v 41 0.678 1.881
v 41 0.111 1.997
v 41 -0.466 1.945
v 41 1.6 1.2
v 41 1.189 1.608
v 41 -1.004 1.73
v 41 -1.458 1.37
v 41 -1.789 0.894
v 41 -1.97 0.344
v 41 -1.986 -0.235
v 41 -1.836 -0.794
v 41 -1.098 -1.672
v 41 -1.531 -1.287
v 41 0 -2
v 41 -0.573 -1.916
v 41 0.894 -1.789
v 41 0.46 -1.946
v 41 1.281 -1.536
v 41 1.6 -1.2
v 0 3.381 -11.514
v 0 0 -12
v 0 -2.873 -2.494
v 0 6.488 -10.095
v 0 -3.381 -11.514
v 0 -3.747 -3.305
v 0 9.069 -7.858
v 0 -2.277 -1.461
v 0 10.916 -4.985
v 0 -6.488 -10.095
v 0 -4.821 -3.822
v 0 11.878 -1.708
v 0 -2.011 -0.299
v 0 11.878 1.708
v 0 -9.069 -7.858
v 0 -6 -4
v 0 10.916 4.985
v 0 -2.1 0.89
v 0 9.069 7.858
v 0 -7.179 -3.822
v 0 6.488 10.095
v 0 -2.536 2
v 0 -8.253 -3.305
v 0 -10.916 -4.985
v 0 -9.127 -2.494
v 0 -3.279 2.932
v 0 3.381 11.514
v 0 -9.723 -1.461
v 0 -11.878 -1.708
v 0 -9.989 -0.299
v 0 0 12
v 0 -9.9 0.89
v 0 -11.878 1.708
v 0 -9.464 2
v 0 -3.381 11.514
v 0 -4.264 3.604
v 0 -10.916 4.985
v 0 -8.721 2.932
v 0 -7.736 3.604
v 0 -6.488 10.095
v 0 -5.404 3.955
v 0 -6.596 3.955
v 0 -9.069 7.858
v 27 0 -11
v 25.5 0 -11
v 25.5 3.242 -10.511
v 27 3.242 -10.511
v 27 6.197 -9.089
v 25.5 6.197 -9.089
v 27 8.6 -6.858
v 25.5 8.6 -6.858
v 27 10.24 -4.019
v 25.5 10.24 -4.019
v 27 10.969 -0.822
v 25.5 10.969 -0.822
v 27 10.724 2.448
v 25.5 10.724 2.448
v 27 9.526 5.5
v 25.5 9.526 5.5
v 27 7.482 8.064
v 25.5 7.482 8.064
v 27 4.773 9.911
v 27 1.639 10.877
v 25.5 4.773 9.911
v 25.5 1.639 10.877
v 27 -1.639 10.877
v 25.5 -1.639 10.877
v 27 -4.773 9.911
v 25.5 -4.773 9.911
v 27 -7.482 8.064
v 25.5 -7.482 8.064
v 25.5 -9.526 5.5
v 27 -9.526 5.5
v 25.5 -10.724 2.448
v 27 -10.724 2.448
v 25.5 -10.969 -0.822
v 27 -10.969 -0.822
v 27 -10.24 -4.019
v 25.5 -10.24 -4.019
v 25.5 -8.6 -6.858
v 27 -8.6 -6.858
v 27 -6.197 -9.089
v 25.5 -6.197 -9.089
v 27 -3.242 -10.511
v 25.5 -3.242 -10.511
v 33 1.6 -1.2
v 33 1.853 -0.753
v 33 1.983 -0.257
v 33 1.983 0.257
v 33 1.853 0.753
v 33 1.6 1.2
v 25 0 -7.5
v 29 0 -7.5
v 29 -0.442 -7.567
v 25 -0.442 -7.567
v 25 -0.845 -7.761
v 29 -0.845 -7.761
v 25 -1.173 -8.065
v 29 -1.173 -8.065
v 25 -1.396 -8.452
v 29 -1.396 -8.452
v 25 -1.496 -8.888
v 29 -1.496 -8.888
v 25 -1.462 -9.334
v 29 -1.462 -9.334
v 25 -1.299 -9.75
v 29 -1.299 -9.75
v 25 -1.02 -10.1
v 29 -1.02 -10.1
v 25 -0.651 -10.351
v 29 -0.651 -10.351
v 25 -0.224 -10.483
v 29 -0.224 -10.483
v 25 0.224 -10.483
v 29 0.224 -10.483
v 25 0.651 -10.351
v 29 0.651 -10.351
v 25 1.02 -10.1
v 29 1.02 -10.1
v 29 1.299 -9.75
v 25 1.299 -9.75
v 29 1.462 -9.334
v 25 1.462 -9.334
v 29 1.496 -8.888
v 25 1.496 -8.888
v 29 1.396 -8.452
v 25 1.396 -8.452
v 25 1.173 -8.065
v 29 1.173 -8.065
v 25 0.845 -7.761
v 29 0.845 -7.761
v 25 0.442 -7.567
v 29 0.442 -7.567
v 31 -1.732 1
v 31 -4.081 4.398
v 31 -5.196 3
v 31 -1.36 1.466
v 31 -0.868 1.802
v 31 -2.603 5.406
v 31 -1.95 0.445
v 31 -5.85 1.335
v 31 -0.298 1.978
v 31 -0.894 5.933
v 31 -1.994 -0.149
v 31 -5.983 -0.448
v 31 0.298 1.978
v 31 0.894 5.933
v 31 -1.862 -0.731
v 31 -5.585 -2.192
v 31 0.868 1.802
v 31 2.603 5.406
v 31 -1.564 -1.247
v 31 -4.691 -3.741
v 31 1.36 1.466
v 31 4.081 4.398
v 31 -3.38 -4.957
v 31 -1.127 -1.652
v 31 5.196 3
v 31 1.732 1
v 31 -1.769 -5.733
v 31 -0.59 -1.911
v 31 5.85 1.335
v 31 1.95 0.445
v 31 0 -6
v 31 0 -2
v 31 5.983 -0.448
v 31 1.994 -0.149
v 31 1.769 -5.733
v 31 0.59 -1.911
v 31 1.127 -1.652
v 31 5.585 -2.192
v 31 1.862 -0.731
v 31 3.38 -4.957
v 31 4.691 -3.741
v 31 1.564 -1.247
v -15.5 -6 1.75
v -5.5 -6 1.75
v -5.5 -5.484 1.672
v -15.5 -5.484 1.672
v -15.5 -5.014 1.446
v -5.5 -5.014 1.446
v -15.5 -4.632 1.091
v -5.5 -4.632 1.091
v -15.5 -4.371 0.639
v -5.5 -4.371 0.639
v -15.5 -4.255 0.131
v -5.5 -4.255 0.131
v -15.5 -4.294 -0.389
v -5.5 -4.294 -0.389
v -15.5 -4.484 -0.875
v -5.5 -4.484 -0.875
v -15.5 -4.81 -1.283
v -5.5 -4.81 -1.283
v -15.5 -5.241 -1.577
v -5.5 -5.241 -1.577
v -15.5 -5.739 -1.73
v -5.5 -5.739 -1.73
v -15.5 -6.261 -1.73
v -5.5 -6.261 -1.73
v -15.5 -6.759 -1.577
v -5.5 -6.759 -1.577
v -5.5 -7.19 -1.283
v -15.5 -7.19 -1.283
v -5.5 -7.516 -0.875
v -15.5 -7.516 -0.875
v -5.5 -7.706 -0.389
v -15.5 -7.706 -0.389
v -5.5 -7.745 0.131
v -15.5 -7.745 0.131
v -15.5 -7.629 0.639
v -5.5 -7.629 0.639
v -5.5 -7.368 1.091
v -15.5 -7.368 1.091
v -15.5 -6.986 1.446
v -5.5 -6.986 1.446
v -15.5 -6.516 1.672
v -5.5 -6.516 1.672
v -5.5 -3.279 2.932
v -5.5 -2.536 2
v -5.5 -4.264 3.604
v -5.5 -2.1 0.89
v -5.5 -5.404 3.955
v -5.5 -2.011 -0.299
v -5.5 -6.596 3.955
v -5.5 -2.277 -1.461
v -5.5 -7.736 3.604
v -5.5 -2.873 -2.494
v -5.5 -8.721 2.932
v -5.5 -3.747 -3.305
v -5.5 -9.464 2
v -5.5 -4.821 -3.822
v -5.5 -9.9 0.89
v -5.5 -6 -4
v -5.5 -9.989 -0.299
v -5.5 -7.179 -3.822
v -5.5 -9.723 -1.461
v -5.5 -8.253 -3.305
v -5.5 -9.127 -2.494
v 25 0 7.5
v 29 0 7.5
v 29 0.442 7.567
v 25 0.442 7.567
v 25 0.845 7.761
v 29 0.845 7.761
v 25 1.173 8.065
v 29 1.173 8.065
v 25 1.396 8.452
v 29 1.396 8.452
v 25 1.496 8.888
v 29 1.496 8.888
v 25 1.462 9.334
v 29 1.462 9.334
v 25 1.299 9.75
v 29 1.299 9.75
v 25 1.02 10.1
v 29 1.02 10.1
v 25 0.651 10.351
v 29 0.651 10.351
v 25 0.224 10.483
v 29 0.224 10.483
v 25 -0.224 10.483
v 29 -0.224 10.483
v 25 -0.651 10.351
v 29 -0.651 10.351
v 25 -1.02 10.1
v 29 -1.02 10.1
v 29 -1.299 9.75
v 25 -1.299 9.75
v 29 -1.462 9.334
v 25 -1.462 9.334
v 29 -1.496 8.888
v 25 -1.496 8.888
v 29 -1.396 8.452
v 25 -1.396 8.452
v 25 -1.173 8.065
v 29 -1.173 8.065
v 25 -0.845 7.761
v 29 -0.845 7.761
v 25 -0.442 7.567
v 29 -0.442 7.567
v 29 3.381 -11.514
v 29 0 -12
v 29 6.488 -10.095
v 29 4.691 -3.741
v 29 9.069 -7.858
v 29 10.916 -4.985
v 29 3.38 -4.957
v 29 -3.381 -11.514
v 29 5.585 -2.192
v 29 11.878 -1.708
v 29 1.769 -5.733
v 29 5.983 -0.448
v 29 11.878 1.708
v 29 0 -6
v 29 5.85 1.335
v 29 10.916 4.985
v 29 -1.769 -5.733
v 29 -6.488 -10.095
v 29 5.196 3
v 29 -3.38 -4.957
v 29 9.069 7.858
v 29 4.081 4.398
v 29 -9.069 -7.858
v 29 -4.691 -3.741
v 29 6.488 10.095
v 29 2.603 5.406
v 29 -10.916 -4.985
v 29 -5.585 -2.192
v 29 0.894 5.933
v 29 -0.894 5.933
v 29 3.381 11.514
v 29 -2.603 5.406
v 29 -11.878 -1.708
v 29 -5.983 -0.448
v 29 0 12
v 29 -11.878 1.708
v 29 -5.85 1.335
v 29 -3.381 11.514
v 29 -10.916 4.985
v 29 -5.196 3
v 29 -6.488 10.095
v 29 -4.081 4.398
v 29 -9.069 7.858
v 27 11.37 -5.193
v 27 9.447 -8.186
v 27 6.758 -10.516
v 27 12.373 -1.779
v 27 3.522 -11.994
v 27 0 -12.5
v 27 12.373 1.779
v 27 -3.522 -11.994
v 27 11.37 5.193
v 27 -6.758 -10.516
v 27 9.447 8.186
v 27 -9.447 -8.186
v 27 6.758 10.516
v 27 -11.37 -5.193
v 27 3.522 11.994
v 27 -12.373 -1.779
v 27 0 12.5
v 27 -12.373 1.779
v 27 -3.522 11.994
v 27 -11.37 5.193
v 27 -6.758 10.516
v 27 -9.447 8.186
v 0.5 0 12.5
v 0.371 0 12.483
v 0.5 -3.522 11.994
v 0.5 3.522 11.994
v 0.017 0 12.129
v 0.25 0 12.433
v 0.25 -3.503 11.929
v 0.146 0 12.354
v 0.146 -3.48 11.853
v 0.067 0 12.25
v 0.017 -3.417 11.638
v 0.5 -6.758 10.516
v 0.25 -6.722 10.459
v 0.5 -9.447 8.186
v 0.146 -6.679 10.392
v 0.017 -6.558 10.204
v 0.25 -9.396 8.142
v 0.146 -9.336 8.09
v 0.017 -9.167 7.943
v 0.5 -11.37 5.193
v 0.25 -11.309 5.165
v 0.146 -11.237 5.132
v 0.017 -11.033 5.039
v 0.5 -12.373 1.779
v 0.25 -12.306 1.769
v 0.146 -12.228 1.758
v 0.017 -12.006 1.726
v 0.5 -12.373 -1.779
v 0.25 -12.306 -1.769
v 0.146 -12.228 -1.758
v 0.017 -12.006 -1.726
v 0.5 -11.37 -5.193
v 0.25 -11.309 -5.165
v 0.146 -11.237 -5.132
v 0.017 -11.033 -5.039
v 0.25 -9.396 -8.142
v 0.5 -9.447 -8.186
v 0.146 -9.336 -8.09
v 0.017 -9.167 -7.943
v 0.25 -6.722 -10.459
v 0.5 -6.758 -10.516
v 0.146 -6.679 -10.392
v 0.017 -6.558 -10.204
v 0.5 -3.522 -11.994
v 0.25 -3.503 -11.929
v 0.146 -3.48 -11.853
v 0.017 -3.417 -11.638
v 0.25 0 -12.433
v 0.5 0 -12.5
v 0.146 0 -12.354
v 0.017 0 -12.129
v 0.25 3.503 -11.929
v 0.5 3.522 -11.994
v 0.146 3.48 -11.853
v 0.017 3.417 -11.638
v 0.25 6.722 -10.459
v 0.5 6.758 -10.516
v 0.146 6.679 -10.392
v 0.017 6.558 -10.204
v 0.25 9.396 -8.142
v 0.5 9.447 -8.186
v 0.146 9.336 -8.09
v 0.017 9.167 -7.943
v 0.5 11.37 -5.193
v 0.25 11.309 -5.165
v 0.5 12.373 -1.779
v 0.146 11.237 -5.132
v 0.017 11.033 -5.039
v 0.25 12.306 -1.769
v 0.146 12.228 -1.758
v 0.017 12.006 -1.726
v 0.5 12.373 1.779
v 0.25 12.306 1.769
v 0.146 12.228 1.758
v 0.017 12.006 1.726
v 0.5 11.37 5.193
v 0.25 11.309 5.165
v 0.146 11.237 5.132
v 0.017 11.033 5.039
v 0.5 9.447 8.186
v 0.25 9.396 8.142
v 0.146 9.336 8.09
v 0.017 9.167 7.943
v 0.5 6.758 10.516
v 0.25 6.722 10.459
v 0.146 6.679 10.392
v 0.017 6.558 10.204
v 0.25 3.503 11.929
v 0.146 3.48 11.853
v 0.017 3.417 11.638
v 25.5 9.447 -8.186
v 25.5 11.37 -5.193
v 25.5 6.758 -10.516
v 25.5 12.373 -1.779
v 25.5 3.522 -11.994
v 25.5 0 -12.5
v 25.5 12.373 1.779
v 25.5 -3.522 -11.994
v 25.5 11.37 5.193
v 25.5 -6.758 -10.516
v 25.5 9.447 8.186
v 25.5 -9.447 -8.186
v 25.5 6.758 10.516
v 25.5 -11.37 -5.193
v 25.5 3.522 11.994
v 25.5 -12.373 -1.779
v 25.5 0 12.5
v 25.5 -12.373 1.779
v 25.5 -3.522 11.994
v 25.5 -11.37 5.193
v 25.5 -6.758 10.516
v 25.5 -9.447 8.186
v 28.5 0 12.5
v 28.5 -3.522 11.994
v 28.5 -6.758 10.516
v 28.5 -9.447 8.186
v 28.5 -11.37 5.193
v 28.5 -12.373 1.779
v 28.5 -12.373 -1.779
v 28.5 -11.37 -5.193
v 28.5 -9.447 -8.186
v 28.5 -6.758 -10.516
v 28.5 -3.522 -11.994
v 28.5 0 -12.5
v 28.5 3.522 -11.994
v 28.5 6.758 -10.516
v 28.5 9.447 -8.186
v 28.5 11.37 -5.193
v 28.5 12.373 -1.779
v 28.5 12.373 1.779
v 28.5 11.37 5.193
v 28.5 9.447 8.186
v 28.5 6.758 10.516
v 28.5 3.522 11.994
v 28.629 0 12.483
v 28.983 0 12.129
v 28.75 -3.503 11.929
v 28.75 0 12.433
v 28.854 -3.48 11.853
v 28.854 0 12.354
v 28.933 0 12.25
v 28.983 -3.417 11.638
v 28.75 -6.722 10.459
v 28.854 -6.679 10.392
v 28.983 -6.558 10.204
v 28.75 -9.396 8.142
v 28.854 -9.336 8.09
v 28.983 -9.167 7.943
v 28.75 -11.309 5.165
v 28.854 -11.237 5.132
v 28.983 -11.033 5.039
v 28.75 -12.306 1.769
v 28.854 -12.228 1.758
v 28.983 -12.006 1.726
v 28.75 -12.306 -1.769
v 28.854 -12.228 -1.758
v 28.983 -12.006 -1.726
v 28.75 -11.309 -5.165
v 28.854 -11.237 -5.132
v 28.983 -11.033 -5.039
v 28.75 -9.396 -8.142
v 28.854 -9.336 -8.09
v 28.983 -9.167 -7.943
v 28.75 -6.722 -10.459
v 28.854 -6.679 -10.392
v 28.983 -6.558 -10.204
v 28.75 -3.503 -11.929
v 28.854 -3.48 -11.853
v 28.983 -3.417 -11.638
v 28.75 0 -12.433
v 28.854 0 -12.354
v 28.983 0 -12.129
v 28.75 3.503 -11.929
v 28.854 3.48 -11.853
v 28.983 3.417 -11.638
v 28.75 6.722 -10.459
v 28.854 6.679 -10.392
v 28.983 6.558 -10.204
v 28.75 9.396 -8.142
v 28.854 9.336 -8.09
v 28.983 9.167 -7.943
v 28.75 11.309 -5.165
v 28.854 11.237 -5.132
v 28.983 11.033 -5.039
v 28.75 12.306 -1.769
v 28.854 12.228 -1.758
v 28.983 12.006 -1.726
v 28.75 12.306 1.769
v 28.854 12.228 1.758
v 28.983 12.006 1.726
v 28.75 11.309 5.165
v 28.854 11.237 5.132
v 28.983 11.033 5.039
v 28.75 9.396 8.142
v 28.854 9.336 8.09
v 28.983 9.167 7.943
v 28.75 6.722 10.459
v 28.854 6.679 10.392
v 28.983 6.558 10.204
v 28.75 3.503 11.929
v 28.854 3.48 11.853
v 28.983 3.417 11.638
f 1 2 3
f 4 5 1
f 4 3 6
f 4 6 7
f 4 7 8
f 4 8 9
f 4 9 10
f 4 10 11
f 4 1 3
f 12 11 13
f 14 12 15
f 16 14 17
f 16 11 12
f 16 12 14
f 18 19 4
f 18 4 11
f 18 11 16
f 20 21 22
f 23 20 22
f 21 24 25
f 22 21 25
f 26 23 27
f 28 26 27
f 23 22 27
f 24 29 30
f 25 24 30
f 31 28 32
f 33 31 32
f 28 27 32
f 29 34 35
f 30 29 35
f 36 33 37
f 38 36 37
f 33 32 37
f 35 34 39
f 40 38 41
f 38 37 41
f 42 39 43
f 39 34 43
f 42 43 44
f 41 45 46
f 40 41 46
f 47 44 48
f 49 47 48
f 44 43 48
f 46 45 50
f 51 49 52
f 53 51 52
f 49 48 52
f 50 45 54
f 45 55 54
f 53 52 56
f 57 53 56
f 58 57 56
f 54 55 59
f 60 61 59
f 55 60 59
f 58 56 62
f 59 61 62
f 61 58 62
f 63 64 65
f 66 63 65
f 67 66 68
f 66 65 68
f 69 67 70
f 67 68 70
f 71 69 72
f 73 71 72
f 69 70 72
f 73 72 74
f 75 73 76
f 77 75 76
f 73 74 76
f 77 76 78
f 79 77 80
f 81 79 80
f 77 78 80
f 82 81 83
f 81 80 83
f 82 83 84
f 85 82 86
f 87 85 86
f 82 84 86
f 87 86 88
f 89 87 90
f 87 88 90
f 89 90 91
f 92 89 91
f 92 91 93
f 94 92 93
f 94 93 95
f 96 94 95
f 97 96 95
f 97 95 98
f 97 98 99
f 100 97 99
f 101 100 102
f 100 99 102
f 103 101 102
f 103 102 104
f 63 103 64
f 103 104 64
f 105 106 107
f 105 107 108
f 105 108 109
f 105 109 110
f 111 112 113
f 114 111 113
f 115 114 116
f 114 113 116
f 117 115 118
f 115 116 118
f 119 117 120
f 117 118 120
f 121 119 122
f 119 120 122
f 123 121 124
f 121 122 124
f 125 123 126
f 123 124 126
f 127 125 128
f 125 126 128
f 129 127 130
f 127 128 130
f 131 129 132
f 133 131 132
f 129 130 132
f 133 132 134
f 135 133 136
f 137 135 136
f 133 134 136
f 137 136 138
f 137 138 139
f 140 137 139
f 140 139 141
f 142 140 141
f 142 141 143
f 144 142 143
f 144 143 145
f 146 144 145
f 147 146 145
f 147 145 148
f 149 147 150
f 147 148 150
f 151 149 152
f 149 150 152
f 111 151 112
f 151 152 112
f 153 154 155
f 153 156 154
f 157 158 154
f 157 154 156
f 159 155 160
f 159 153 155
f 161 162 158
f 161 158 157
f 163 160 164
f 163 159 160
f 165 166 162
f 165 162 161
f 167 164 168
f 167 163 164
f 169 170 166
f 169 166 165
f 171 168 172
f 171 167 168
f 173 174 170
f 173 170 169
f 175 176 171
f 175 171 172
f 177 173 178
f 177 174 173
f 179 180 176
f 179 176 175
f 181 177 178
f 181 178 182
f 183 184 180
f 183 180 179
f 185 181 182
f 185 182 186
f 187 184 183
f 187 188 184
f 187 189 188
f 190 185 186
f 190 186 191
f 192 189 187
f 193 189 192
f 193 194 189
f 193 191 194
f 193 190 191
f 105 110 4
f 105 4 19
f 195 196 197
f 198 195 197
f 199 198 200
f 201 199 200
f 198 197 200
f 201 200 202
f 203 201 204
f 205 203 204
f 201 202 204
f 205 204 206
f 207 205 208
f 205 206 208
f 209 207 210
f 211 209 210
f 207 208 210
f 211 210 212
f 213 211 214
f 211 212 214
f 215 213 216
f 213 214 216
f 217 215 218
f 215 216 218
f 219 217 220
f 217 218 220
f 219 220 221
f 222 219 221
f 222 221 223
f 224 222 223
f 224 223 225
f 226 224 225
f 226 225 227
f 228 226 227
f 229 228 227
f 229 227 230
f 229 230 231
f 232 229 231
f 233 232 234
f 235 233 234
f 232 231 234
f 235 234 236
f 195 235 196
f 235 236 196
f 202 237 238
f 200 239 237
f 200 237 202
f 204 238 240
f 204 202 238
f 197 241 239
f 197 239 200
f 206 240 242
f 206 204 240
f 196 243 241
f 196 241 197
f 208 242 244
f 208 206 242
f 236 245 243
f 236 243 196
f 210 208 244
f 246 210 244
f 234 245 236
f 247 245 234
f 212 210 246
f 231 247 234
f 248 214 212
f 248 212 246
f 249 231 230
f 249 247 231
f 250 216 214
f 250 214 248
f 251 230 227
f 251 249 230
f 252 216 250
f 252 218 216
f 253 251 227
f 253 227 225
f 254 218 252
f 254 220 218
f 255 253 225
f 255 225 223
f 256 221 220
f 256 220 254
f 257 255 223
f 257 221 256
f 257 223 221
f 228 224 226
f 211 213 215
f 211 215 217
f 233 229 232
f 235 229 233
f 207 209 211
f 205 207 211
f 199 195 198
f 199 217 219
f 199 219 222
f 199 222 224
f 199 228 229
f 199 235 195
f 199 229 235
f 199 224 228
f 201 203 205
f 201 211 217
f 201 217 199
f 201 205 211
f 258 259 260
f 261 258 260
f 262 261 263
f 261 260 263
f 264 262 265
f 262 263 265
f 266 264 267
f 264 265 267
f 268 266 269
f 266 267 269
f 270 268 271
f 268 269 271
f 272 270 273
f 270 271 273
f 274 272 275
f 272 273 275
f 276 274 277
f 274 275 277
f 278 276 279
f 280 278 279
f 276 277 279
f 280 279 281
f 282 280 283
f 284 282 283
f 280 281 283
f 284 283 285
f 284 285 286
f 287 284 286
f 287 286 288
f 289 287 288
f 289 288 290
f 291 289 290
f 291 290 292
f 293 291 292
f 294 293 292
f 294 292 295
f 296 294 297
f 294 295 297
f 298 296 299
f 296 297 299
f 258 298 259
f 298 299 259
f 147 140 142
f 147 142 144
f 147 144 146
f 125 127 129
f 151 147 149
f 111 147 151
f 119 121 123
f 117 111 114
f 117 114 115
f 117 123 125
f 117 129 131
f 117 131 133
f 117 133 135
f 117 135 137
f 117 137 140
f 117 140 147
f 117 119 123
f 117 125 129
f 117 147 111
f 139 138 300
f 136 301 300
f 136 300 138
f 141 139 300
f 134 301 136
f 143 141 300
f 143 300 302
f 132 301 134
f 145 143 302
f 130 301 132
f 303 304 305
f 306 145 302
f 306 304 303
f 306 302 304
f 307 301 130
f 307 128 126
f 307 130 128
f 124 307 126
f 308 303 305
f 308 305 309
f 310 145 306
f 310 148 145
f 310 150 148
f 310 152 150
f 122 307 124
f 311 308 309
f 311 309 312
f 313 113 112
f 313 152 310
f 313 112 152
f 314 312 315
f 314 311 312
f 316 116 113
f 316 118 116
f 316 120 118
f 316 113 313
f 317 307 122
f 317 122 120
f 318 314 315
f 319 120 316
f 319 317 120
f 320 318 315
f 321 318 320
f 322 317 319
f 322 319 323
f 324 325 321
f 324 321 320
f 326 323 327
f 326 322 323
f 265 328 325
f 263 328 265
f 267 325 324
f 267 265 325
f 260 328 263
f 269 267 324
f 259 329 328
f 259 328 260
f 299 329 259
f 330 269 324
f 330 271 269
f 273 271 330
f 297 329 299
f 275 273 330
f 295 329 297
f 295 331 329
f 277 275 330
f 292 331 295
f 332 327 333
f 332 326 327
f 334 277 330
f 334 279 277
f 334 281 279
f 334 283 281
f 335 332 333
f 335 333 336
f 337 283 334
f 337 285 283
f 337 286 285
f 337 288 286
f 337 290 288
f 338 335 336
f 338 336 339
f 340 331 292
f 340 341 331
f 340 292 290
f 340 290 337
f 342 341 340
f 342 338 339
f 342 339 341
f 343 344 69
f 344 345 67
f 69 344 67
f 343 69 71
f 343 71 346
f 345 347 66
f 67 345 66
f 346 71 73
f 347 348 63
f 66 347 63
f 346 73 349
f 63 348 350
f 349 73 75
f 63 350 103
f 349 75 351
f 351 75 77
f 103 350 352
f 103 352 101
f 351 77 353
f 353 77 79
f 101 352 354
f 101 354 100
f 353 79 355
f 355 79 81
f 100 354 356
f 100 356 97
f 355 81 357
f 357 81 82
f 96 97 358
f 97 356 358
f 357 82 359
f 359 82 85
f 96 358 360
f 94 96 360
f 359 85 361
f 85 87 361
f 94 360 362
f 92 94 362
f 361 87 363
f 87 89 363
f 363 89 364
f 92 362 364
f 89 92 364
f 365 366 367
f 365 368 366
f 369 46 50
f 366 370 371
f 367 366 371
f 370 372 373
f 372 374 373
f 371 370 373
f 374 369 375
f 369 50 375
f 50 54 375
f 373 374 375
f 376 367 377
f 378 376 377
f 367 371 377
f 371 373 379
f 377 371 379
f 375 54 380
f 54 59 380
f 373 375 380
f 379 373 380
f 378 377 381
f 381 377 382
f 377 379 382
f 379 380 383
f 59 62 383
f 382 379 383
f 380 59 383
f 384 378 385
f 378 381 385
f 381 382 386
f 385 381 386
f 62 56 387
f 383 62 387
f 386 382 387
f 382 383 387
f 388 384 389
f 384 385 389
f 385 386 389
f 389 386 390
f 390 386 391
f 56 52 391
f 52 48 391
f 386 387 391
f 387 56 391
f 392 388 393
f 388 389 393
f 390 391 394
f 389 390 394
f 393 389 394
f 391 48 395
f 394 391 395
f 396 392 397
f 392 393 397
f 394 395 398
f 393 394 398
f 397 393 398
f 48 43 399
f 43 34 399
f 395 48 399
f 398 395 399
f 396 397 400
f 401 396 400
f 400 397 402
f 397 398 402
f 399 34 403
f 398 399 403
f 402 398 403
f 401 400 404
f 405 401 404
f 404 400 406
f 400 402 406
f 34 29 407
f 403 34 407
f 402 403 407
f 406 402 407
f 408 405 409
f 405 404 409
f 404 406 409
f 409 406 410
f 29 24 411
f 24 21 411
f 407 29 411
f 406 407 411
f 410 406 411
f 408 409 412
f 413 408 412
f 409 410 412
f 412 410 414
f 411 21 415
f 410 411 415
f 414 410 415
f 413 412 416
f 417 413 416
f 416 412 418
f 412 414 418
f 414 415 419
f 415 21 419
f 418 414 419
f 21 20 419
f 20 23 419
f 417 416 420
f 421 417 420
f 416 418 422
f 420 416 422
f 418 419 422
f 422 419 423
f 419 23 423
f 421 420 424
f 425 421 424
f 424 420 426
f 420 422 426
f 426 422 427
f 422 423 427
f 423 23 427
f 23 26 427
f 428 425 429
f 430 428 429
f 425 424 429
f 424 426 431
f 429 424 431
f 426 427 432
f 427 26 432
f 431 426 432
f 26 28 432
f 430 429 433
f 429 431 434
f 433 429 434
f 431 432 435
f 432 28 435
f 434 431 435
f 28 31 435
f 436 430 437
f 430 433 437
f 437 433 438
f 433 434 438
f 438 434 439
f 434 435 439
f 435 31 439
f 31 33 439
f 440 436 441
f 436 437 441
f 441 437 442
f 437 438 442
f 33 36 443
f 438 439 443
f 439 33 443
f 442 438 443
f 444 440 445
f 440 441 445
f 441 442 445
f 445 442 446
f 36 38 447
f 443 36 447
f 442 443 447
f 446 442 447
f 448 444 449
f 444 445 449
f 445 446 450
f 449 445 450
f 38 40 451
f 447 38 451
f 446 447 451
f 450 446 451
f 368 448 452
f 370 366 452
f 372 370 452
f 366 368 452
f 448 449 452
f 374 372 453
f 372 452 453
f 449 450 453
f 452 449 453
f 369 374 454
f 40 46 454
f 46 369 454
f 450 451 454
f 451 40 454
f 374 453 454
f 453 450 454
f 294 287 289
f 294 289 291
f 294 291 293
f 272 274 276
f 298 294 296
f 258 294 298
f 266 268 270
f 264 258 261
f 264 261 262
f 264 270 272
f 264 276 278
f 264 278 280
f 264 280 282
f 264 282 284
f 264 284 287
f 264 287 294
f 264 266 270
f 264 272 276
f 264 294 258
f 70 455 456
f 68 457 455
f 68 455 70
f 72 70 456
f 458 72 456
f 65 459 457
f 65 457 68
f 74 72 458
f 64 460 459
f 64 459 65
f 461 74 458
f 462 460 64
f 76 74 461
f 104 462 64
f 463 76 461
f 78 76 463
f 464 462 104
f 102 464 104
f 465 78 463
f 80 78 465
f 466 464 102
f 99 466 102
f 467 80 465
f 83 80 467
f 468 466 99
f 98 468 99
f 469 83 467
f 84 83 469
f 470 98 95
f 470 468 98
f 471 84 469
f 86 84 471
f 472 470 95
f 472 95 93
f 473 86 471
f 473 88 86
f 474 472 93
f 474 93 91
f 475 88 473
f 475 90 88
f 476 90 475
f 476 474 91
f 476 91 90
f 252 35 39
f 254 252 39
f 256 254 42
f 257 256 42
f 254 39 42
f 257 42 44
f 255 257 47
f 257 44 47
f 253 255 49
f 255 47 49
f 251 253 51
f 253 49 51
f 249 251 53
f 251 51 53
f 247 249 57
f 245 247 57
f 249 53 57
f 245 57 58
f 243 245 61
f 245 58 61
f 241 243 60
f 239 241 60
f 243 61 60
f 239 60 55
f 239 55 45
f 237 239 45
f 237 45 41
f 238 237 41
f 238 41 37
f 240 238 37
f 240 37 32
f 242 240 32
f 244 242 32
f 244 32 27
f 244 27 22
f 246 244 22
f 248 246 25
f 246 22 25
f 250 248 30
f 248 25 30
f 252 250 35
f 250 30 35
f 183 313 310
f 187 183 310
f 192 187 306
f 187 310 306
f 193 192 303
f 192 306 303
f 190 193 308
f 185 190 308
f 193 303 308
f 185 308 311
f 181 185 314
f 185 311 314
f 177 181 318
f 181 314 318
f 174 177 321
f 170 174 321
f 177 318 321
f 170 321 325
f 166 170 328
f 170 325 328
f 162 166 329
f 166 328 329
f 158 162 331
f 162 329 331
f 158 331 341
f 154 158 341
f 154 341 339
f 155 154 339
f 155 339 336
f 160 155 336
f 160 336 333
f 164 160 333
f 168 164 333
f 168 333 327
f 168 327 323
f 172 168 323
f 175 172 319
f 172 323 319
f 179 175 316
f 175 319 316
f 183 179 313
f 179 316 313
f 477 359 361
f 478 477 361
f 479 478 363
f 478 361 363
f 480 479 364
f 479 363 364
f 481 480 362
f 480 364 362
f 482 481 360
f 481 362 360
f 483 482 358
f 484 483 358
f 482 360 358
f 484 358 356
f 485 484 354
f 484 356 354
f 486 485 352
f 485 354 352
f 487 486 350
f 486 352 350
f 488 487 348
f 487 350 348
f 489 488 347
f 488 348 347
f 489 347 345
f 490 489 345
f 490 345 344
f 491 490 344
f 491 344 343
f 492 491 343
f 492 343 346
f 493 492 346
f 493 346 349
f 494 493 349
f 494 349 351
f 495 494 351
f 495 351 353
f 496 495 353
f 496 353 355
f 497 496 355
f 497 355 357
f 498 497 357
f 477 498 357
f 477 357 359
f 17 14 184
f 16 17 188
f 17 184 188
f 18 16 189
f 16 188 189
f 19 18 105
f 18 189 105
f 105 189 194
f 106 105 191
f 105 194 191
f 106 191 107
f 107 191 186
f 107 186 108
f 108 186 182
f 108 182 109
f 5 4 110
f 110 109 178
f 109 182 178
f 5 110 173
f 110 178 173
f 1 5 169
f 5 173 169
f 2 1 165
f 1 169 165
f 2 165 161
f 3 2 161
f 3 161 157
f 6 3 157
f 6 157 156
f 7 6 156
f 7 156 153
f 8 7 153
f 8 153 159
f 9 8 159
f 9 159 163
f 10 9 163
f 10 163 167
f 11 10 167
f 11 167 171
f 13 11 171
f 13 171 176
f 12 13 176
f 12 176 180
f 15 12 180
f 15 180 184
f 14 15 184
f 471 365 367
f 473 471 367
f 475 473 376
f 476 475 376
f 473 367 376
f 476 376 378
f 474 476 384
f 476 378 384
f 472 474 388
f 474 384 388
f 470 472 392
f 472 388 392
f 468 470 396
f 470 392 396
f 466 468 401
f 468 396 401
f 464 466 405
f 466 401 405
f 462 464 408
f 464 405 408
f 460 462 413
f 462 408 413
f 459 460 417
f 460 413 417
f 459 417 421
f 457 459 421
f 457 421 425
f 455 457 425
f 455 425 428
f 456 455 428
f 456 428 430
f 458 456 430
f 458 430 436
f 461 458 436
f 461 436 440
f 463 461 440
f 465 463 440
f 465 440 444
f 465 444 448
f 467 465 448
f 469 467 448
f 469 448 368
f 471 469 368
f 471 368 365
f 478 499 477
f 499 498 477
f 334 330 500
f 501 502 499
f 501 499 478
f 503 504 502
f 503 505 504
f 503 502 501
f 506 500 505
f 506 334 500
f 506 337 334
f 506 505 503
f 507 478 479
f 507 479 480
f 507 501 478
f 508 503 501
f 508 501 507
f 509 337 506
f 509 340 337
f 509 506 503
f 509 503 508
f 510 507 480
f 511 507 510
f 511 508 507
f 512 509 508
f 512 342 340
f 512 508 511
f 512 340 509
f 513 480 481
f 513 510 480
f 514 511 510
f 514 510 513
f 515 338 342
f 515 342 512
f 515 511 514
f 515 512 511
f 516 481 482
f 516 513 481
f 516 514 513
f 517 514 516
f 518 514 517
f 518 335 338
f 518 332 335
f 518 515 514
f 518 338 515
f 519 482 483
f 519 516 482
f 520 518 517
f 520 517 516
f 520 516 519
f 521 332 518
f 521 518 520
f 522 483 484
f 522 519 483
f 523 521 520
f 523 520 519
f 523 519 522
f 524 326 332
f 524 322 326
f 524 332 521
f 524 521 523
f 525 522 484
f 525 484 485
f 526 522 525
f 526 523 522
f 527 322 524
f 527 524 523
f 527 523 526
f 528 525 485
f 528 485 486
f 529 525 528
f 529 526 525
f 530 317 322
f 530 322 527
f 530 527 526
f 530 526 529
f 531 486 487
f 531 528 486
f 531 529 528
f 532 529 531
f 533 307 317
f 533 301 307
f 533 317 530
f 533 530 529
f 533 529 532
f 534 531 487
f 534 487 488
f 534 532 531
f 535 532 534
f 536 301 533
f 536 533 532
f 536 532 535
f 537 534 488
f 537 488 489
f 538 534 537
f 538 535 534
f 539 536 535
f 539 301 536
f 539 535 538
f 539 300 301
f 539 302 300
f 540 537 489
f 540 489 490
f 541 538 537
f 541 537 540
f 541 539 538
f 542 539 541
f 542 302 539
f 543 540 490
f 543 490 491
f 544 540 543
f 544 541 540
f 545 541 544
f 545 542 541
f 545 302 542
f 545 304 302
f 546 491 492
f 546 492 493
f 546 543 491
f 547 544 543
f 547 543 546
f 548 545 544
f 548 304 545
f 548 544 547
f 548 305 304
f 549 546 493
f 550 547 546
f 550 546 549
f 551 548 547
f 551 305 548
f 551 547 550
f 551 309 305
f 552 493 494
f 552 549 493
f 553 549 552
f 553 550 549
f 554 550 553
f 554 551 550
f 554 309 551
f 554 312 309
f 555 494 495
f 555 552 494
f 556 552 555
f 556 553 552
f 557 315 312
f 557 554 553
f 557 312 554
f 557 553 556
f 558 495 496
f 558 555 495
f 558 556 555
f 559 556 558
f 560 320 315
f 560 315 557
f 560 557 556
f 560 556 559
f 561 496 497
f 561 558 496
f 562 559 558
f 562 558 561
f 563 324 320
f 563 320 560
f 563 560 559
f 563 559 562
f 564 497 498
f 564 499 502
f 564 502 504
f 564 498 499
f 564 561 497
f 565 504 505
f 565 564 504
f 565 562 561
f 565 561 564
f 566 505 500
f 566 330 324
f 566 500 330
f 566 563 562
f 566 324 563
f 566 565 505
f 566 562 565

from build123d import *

# Parameters (mm, degrees)
SKETCH_1_R          = 12.5
EXTRUDE_1_DEPTH     = 29
CUT_EXTRUDE_START   = -1.5
SKETCH_2_R          = 12.5
SKETCH_2_R_2        = 11
CUT_EXTRUDE_1_DEPTH = 1.5
FILLET_1_R          = 0.5
SKETCH_3_R          = 6
EXTRUDE_2_DEPTH     = 2
SKETCH_4_R          = 2
EXTRUDE_3_DEPTH     = 10
CUT_EXTRUDE_START_2 = -8
CUT_EXTRUDE_2_DEPTH = 8
SKETCH_6_R          = 4
EXTRUDE_4_DEPTH     = 5.5
SKETCH_7_R          = 1.75
EXTRUDE_5_DEPTH     = 10
SKETCH_8_R          = 1.5
CUT_EXTRUDE_3_DEPTH = 4


with BuildPart() as part:
    # ｽｹｯﾁ1 → ﾎﾞｽ - 押し出し1 (new body)
    with BuildSketch(Plane(origin=(0, 0, 0), x_dir=(0, 0, -1), z_dir=(1, 0, 0))):
        with Locations(Location((0, 0, 0), (0, 0, 180))):
            Circle(SKETCH_1_R)
    extrude(amount=EXTRUDE_1_DEPTH)

    # ｽｹｯﾁ2 → ｶｯﾄ - 押し出し1 (cut)
    with BuildSketch(Plane(origin=(27, 0, 0), x_dir=(0, 0, -1), z_dir=(1, 0, 0)).offset(CUT_EXTRUDE_START)):
        with Locations(Location((0, 0, 0), (0, 0, 180))):
            Circle(SKETCH_2_R)
        Circle(SKETCH_2_R_2, mode=Mode.SUBTRACT)
    extrude(amount=CUT_EXTRUDE_1_DEPTH, mode=Mode.SUBTRACT)

    # ﾌｨﾚｯﾄ1
    fillet_1_edges = [part.edges().sort_by_distance(p)[0] for p in [
        (0, 0, -12.5),
        (29, 0, -12.5),
    ]]
    fillet(fillet_1_edges, radius=FILLET_1_R)

    # ｽｹｯﾁ3 → ﾎﾞｽ - 押し出し2 (add)
    with BuildSketch(Plane(origin=(29, 0, 0), x_dir=(0, 0, -1), z_dir=(1, 0, 0))):
        Circle(SKETCH_3_R)
    extrude(amount=EXTRUDE_2_DEPTH)

    # ｽｹｯﾁ4 → ﾎﾞｽ - 押し出し3 (add)
    with BuildSketch(Plane(origin=(31, 0, 0), x_dir=(0, 0, -1), z_dir=(1, 0, 0))):
        Circle(SKETCH_4_R)
    extrude(amount=EXTRUDE_3_DEPTH)

    # ｽｹｯﾁ5 → ｶｯﾄ - 押し出し2 (cut)
    with BuildSketch(Plane(origin=(41, 0, 0), x_dir=(0, 0, -1), z_dir=(1, 0, 0)).offset(CUT_EXTRUDE_START_2)):
        with BuildLine():
            Line((-1.2, 1.6), (1.2, 1.6))
            ThreePointArc((1.2, 1.6), (0, 2), (-1.2, 1.6))
        make_face()
    extrude(amount=CUT_EXTRUDE_2_DEPTH, mode=Mode.SUBTRACT)

    # ｽｹｯﾁ6 → ﾎﾞｽ - 押し出し4 (add)
    with BuildSketch(Plane.ZY):
        with Locations(Location((0, -6, 0), (0, 0, 180))):
            Circle(SKETCH_6_R)
    extrude(amount=EXTRUDE_4_DEPTH)

    # ｽｹｯﾁ7 → ﾎﾞｽ - 押し出し5 (add)
    with BuildSketch(Plane.ZY.offset(5.5)):
        with Locations((0, -6)):
            Circle(SKETCH_7_R)
    extrude(amount=EXTRUDE_5_DEPTH)

    # ｽｹｯﾁ8 → ｶｯﾄ - 押し出し3 (cut)
    with BuildSketch(Plane(origin=(29, 0, 0), x_dir=(0, 0, -1), z_dir=(1, 0, 0))):
        with Locations((-9, 0)):
            Circle(SKETCH_8_R)
        with Locations(Location((9, 0, 0), (0, 0, 180))):
            Circle(SKETCH_8_R)
    extrude(amount=-CUT_EXTRUDE_3_DEPTH, mode=Mode.SUBTRACT)


solid = part.part
